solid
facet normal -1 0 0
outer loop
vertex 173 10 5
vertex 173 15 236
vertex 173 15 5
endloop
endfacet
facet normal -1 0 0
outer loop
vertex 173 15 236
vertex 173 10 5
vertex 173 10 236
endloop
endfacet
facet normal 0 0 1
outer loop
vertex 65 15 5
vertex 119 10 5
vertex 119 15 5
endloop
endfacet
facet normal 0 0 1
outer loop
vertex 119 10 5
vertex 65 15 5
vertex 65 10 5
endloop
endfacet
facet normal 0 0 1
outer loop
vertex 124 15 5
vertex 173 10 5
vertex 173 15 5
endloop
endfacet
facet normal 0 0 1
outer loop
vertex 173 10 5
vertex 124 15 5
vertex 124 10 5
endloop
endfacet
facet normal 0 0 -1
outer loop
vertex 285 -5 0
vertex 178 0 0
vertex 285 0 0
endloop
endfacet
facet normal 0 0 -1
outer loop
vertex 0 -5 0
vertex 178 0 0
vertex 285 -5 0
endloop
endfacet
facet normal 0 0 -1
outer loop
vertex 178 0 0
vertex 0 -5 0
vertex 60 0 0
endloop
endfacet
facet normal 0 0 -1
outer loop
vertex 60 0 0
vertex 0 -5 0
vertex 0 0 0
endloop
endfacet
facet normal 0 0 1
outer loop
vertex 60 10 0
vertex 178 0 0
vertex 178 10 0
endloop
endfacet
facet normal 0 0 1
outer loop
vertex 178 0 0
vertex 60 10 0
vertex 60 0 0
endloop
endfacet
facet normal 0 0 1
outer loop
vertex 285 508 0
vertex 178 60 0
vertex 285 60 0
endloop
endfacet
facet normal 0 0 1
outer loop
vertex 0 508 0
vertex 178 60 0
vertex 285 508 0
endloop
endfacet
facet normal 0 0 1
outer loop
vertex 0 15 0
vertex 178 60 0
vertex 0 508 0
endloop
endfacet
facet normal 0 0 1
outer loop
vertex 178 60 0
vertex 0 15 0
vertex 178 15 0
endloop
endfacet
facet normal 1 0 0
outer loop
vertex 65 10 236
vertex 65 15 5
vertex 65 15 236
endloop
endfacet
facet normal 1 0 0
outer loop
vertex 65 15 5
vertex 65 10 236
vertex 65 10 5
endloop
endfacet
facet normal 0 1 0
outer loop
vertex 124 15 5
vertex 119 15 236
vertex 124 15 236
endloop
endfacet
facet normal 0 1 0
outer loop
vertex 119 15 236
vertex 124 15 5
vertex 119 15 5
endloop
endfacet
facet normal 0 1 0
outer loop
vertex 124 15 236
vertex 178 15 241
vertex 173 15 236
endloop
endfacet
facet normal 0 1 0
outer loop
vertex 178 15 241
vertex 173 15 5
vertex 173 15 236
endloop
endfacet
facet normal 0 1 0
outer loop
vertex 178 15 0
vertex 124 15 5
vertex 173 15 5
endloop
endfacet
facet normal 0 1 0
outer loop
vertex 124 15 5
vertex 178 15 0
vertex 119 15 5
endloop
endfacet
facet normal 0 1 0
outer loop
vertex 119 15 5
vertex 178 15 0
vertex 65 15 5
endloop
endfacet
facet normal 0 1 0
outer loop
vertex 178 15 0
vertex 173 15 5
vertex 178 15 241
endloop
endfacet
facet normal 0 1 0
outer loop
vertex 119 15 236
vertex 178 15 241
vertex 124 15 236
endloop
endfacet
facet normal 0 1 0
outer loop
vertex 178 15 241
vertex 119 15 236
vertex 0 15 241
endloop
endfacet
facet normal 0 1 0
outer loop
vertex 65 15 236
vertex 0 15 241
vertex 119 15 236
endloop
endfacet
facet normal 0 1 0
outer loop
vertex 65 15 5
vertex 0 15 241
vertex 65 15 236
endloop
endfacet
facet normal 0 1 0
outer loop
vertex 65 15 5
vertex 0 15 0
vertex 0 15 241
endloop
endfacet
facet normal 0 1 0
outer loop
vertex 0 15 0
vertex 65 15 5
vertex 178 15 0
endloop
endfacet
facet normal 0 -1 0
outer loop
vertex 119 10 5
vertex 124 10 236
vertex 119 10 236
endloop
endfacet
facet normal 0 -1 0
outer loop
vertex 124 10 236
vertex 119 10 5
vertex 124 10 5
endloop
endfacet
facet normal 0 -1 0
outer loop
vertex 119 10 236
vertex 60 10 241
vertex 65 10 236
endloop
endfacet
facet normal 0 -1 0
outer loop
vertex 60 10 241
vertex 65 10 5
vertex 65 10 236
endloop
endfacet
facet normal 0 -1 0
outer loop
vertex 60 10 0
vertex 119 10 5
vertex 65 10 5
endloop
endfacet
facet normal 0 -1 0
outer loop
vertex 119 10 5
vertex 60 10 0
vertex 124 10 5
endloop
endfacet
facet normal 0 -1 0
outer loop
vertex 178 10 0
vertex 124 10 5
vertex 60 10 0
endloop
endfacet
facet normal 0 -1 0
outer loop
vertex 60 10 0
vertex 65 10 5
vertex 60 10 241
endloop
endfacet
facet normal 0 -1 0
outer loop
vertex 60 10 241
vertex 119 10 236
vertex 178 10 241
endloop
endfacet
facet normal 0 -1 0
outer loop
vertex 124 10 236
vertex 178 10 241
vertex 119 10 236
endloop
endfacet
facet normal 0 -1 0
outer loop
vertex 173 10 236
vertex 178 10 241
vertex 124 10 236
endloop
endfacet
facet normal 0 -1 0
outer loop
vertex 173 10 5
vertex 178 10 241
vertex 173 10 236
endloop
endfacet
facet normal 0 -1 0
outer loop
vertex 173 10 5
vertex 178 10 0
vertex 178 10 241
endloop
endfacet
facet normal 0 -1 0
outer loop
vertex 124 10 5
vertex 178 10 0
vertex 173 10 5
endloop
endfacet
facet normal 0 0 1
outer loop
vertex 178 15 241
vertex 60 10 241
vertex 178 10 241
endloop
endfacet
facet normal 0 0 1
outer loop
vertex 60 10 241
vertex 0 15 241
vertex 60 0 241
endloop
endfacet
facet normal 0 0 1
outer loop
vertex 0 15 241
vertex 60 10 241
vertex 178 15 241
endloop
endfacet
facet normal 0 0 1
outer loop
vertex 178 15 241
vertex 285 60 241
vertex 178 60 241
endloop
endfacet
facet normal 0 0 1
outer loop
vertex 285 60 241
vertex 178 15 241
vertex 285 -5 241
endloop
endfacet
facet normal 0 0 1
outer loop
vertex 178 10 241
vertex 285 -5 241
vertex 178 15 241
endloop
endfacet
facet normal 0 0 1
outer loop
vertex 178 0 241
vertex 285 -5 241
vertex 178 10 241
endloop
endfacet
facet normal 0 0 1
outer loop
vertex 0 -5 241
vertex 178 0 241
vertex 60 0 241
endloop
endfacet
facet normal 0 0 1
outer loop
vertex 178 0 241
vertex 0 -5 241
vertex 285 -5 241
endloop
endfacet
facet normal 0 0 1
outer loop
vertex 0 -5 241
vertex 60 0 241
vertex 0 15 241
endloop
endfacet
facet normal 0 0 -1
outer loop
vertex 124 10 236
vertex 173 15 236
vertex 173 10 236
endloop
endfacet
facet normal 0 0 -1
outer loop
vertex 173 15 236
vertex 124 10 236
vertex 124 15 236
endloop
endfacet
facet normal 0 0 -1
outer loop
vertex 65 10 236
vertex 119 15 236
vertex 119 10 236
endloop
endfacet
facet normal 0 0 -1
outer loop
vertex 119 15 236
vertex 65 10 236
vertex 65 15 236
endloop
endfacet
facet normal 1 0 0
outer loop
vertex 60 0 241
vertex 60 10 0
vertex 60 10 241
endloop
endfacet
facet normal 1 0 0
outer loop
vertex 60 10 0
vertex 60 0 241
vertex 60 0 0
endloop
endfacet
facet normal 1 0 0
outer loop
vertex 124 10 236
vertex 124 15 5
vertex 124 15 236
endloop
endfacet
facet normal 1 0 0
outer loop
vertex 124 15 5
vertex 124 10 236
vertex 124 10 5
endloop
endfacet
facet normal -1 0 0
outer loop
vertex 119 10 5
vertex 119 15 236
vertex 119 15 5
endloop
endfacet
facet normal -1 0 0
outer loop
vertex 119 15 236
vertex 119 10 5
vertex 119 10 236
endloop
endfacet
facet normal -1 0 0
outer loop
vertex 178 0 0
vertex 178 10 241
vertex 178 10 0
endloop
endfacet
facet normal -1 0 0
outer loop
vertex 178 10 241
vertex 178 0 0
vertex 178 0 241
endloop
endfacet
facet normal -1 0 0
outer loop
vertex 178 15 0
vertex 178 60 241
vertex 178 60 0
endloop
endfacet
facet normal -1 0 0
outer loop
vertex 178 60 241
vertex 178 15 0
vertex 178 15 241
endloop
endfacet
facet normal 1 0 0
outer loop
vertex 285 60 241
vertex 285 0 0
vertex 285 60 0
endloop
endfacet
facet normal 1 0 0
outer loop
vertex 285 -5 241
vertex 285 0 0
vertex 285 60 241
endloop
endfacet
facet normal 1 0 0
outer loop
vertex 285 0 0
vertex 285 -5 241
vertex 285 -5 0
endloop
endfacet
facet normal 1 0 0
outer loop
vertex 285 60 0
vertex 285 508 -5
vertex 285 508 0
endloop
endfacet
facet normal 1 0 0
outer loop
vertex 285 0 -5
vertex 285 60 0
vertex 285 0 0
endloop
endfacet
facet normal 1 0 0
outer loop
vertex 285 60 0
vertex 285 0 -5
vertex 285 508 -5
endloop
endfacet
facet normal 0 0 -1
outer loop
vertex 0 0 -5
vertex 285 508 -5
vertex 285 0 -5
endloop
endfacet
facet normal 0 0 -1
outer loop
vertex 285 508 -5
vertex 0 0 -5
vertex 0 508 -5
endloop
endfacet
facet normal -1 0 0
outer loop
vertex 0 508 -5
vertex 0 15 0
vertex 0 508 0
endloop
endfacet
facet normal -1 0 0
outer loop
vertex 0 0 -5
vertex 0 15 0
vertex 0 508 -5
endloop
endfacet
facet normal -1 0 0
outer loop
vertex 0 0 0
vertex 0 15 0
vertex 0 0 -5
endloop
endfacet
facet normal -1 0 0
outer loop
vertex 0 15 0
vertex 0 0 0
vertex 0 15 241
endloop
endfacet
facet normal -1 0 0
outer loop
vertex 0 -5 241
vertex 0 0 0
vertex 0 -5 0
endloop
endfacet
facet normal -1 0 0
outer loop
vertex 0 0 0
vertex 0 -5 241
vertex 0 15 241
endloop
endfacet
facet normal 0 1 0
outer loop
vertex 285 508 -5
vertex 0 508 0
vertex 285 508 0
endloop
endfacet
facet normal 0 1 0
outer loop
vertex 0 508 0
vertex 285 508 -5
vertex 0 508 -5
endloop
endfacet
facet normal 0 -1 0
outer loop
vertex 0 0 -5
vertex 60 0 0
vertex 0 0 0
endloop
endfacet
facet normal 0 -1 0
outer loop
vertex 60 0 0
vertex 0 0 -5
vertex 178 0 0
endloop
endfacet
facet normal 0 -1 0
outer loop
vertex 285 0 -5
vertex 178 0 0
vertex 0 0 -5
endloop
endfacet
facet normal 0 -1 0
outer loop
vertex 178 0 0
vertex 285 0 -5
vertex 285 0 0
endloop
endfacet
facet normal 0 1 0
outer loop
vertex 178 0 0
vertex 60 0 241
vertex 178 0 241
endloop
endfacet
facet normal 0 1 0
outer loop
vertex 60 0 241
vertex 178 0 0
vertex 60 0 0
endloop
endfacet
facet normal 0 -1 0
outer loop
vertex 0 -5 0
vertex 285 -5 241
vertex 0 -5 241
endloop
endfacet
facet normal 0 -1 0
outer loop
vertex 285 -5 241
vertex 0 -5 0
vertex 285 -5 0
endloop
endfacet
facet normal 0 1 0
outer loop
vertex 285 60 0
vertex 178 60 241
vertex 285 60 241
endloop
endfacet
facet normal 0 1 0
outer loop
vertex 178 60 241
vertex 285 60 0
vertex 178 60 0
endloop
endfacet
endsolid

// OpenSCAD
// all in cm
spacer = 5;

toilet_wall_width = 107;
hole_width = 178;
green_box_width = 60;
small_hole_width = hole_width - green_box_width;
max_depth = 45;

room_width = toilet_wall_width + hole_width;
room_length = 508;
room_height = 241;

stone_floor();
hole();
toilet_wall();
green_box();
beams();

// x, y, z

module stone_floor() {
  translate([0, 0, -spacer])
    color("GhostWhite") cube([room_width, room_length, spacer]);
}

module green_box() {
  translate([0, -spacer, 0])
    color("Green") cube([green_box_width, spacer * 4, room_height]);
}

module hole() {
  translate([green_box_width, -spacer, 0])
    color("Gray") cube([small_hole_width, spacer, room_height]);
}

module toilet_wall() {
  translate([hole_width, -spacer, 0])
    color("Silver") cube([toilet_wall_width, max_depth + (spacer * 4), room_height]);
}

module beams() {
  translate([green_box_width + 5, spacer * 2, 0])
    color("Aqua") cube([small_hole_width - 10, 5, 5]);

  translate([green_box_width + 5, spacer * 2, room_height - 5])
    color("Aqua") cube([small_hole_width - 10, 5, 5]);

  translate([green_box_width, spacer * 2, 0])
    color("DarkGoldenrod") cube([5, 5, room_height]);

  translate([green_box_width + (small_hole_width / 2), spacer * 2, 5])
    color("DarkGoldenrod") cube([5, 5, room_height - 10]);

  translate([hole_width - 5, spacer * 2, 0])
    color("DarkGoldenrod") cube([5, 5, room_height]);
}
